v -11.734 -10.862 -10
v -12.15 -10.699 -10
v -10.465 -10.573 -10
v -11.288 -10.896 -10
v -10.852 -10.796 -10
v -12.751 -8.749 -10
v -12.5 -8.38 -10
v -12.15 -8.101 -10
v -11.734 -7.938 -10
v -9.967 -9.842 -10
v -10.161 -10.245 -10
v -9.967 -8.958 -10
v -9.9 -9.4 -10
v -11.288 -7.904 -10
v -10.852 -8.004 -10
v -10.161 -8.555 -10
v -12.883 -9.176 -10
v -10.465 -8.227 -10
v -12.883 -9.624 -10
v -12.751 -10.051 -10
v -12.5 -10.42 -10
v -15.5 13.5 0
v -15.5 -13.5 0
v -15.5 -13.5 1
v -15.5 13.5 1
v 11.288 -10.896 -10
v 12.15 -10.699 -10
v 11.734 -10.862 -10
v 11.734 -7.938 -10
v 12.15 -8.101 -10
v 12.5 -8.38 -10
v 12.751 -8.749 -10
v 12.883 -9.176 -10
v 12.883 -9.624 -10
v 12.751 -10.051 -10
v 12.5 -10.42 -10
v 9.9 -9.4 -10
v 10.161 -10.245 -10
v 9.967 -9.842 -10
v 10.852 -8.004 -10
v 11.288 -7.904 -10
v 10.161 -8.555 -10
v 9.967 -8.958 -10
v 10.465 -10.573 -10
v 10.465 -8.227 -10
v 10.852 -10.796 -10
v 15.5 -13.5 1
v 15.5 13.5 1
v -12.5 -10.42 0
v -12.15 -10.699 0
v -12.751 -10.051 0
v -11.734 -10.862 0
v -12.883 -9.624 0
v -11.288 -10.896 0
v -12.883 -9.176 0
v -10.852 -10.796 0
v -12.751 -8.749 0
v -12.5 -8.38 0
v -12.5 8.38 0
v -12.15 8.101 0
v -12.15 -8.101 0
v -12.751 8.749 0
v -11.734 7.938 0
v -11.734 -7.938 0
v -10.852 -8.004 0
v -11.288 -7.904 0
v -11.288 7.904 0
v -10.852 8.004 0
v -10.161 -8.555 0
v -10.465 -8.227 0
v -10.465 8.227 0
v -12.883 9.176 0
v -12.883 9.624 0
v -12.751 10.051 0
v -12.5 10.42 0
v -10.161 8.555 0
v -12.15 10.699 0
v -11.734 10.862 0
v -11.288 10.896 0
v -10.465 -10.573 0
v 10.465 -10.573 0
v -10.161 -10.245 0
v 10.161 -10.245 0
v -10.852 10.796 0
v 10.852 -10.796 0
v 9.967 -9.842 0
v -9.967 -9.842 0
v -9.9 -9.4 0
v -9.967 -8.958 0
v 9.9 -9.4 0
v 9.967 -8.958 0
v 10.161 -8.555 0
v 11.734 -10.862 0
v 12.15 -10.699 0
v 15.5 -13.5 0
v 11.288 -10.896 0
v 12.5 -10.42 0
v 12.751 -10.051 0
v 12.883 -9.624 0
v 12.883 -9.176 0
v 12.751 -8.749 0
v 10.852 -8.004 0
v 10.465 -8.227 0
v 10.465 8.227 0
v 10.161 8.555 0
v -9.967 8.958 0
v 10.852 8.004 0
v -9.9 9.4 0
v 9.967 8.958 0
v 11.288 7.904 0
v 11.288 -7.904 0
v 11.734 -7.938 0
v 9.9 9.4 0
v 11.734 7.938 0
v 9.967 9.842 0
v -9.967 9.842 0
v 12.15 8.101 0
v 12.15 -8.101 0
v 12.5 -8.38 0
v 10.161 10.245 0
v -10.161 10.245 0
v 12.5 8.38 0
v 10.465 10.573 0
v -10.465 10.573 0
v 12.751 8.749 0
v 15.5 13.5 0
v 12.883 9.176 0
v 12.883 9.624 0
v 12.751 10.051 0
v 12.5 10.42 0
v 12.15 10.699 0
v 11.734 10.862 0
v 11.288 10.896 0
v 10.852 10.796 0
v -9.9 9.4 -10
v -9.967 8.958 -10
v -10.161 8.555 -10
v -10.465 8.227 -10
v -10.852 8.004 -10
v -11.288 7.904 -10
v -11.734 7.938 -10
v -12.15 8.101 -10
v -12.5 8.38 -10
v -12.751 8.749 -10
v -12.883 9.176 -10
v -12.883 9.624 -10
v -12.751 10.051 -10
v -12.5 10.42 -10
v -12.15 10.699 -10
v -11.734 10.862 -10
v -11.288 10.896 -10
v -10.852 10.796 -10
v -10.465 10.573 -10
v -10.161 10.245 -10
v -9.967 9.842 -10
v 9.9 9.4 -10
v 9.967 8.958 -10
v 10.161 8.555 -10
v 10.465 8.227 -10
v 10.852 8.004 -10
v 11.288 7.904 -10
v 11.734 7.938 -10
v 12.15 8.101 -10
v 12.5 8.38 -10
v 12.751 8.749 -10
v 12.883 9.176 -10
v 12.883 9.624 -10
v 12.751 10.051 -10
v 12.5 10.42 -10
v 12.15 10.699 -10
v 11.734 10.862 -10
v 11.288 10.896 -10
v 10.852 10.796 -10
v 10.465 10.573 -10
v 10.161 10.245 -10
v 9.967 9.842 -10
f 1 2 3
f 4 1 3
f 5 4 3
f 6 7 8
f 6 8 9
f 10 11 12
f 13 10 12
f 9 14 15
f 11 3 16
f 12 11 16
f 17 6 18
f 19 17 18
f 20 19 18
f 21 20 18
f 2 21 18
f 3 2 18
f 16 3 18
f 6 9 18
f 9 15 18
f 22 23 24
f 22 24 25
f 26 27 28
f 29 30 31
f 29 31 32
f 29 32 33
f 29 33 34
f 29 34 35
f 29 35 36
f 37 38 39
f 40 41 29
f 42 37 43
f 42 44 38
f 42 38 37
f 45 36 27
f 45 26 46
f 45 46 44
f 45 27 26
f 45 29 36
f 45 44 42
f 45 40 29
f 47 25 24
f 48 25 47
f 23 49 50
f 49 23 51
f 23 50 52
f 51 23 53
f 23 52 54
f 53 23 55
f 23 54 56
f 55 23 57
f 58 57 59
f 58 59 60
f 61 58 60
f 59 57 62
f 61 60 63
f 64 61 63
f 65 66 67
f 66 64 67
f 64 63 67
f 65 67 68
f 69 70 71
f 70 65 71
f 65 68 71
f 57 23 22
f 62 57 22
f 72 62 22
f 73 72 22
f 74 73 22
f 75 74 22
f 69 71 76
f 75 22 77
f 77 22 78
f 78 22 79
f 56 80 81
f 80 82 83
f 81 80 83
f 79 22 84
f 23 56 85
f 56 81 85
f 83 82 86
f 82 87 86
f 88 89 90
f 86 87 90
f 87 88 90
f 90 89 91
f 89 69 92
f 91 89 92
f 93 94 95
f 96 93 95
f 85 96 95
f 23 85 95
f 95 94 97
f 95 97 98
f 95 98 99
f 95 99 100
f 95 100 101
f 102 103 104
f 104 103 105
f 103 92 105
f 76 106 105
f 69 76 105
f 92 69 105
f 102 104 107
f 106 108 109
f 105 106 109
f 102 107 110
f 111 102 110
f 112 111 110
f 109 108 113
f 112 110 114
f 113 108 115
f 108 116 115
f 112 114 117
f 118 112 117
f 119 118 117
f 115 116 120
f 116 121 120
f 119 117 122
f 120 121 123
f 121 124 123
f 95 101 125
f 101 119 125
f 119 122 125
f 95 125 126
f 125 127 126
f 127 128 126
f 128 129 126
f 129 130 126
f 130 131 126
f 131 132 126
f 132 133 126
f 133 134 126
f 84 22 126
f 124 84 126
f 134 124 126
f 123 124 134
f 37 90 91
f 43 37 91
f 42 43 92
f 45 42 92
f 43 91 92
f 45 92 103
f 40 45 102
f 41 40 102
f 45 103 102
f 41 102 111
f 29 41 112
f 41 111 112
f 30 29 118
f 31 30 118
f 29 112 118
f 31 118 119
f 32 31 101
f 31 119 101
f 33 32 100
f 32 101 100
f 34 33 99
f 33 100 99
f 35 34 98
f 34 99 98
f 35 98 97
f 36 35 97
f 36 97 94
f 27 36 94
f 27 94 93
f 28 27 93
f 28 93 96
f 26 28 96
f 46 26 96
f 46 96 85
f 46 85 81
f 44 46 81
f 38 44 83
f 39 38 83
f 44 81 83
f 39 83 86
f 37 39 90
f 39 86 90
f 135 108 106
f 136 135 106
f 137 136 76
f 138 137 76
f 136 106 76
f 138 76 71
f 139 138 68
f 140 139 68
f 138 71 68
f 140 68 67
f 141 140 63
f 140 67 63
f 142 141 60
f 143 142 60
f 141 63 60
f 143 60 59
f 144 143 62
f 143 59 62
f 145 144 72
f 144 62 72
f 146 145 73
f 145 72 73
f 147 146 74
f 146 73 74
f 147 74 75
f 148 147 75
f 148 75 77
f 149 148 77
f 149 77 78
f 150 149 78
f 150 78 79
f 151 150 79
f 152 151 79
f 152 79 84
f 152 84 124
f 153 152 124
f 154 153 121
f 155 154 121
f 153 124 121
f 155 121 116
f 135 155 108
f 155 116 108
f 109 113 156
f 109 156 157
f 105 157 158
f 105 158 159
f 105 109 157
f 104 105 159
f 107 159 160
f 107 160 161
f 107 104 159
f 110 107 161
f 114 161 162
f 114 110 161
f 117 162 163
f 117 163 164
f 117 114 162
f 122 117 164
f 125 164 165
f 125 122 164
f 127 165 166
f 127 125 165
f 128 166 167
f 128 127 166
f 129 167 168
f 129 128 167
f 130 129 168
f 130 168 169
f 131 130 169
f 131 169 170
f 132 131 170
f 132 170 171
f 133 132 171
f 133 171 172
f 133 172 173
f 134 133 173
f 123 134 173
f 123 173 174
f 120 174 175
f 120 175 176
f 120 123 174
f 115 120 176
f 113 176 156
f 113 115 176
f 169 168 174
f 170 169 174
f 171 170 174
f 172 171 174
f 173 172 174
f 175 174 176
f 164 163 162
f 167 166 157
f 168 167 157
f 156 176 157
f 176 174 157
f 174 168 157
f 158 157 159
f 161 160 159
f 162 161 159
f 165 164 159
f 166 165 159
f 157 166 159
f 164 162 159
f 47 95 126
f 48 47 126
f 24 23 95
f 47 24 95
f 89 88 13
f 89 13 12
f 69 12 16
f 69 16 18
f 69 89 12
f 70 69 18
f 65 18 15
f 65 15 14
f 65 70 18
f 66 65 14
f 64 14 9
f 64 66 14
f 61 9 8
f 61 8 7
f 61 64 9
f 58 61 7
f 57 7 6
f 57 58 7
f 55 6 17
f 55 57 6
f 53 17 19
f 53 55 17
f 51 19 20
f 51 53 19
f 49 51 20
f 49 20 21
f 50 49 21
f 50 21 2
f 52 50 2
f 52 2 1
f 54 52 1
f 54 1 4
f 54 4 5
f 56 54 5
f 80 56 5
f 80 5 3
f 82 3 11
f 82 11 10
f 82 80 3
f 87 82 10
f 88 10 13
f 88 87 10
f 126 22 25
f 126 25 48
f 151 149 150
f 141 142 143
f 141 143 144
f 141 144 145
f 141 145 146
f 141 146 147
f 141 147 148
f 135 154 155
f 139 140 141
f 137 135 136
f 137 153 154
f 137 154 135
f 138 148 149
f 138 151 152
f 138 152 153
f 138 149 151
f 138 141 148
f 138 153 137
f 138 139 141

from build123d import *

# Parameters (mm, degrees)
SKETCH1_W               = 31
SKETCH1_H               = 27
BOSS_EXTRUDE1_DEPTH     = 1
SKETCH2_R               = 1.5
BOSS_EXTRUDE2_DEPTH     = 10
MIRROR2_COPY_1_SKETCH_R = 1.5
MIRROR2_COPY_1_DEPTH    = 10


with BuildPart() as part:
    # Sketch1 → Boss-Extrude1 (new body)
    with BuildSketch(Plane.XY):
        Rectangle(SKETCH1_W, SKETCH1_H)
    extrude(amount=BOSS_EXTRUDE1_DEPTH)

    # Sketch2 → Boss-Extrude2 (add)
    with BuildSketch(Plane(origin=(0, 0, 0), x_dir=(-1, 0, 0), z_dir=(0, 0, -1))):
        with Locations((-11.4, -9.4)):
            Circle(SKETCH2_R)
    boss_extrude2 = extrude(amount=BOSS_EXTRUDE2_DEPTH)

    # Mirror1: Boss-Extrude2 across plane
    add(boss_extrude2.mirror(Plane.ZX))

    # Mirror2: Boss-Extrude2 across plane
    add(boss_extrude2.mirror(Plane(origin=(0, 0, 0), x_dir=(0, 0, 1), z_dir=(1, 0, 0))))

    # Mirror2 copy 1 sketch → Mirror2 copy 1 (add)
    with BuildSketch(Plane(origin=(0, 0, 0), x_dir=(1, 0, 0), z_dir=(0, 0, -1))):
        with Locations((-11.4, -9.4)):
            Circle(MIRROR2_COPY_1_SKETCH_R)
    extrude(amount=MIRROR2_COPY_1_DEPTH)


solid = part.part
